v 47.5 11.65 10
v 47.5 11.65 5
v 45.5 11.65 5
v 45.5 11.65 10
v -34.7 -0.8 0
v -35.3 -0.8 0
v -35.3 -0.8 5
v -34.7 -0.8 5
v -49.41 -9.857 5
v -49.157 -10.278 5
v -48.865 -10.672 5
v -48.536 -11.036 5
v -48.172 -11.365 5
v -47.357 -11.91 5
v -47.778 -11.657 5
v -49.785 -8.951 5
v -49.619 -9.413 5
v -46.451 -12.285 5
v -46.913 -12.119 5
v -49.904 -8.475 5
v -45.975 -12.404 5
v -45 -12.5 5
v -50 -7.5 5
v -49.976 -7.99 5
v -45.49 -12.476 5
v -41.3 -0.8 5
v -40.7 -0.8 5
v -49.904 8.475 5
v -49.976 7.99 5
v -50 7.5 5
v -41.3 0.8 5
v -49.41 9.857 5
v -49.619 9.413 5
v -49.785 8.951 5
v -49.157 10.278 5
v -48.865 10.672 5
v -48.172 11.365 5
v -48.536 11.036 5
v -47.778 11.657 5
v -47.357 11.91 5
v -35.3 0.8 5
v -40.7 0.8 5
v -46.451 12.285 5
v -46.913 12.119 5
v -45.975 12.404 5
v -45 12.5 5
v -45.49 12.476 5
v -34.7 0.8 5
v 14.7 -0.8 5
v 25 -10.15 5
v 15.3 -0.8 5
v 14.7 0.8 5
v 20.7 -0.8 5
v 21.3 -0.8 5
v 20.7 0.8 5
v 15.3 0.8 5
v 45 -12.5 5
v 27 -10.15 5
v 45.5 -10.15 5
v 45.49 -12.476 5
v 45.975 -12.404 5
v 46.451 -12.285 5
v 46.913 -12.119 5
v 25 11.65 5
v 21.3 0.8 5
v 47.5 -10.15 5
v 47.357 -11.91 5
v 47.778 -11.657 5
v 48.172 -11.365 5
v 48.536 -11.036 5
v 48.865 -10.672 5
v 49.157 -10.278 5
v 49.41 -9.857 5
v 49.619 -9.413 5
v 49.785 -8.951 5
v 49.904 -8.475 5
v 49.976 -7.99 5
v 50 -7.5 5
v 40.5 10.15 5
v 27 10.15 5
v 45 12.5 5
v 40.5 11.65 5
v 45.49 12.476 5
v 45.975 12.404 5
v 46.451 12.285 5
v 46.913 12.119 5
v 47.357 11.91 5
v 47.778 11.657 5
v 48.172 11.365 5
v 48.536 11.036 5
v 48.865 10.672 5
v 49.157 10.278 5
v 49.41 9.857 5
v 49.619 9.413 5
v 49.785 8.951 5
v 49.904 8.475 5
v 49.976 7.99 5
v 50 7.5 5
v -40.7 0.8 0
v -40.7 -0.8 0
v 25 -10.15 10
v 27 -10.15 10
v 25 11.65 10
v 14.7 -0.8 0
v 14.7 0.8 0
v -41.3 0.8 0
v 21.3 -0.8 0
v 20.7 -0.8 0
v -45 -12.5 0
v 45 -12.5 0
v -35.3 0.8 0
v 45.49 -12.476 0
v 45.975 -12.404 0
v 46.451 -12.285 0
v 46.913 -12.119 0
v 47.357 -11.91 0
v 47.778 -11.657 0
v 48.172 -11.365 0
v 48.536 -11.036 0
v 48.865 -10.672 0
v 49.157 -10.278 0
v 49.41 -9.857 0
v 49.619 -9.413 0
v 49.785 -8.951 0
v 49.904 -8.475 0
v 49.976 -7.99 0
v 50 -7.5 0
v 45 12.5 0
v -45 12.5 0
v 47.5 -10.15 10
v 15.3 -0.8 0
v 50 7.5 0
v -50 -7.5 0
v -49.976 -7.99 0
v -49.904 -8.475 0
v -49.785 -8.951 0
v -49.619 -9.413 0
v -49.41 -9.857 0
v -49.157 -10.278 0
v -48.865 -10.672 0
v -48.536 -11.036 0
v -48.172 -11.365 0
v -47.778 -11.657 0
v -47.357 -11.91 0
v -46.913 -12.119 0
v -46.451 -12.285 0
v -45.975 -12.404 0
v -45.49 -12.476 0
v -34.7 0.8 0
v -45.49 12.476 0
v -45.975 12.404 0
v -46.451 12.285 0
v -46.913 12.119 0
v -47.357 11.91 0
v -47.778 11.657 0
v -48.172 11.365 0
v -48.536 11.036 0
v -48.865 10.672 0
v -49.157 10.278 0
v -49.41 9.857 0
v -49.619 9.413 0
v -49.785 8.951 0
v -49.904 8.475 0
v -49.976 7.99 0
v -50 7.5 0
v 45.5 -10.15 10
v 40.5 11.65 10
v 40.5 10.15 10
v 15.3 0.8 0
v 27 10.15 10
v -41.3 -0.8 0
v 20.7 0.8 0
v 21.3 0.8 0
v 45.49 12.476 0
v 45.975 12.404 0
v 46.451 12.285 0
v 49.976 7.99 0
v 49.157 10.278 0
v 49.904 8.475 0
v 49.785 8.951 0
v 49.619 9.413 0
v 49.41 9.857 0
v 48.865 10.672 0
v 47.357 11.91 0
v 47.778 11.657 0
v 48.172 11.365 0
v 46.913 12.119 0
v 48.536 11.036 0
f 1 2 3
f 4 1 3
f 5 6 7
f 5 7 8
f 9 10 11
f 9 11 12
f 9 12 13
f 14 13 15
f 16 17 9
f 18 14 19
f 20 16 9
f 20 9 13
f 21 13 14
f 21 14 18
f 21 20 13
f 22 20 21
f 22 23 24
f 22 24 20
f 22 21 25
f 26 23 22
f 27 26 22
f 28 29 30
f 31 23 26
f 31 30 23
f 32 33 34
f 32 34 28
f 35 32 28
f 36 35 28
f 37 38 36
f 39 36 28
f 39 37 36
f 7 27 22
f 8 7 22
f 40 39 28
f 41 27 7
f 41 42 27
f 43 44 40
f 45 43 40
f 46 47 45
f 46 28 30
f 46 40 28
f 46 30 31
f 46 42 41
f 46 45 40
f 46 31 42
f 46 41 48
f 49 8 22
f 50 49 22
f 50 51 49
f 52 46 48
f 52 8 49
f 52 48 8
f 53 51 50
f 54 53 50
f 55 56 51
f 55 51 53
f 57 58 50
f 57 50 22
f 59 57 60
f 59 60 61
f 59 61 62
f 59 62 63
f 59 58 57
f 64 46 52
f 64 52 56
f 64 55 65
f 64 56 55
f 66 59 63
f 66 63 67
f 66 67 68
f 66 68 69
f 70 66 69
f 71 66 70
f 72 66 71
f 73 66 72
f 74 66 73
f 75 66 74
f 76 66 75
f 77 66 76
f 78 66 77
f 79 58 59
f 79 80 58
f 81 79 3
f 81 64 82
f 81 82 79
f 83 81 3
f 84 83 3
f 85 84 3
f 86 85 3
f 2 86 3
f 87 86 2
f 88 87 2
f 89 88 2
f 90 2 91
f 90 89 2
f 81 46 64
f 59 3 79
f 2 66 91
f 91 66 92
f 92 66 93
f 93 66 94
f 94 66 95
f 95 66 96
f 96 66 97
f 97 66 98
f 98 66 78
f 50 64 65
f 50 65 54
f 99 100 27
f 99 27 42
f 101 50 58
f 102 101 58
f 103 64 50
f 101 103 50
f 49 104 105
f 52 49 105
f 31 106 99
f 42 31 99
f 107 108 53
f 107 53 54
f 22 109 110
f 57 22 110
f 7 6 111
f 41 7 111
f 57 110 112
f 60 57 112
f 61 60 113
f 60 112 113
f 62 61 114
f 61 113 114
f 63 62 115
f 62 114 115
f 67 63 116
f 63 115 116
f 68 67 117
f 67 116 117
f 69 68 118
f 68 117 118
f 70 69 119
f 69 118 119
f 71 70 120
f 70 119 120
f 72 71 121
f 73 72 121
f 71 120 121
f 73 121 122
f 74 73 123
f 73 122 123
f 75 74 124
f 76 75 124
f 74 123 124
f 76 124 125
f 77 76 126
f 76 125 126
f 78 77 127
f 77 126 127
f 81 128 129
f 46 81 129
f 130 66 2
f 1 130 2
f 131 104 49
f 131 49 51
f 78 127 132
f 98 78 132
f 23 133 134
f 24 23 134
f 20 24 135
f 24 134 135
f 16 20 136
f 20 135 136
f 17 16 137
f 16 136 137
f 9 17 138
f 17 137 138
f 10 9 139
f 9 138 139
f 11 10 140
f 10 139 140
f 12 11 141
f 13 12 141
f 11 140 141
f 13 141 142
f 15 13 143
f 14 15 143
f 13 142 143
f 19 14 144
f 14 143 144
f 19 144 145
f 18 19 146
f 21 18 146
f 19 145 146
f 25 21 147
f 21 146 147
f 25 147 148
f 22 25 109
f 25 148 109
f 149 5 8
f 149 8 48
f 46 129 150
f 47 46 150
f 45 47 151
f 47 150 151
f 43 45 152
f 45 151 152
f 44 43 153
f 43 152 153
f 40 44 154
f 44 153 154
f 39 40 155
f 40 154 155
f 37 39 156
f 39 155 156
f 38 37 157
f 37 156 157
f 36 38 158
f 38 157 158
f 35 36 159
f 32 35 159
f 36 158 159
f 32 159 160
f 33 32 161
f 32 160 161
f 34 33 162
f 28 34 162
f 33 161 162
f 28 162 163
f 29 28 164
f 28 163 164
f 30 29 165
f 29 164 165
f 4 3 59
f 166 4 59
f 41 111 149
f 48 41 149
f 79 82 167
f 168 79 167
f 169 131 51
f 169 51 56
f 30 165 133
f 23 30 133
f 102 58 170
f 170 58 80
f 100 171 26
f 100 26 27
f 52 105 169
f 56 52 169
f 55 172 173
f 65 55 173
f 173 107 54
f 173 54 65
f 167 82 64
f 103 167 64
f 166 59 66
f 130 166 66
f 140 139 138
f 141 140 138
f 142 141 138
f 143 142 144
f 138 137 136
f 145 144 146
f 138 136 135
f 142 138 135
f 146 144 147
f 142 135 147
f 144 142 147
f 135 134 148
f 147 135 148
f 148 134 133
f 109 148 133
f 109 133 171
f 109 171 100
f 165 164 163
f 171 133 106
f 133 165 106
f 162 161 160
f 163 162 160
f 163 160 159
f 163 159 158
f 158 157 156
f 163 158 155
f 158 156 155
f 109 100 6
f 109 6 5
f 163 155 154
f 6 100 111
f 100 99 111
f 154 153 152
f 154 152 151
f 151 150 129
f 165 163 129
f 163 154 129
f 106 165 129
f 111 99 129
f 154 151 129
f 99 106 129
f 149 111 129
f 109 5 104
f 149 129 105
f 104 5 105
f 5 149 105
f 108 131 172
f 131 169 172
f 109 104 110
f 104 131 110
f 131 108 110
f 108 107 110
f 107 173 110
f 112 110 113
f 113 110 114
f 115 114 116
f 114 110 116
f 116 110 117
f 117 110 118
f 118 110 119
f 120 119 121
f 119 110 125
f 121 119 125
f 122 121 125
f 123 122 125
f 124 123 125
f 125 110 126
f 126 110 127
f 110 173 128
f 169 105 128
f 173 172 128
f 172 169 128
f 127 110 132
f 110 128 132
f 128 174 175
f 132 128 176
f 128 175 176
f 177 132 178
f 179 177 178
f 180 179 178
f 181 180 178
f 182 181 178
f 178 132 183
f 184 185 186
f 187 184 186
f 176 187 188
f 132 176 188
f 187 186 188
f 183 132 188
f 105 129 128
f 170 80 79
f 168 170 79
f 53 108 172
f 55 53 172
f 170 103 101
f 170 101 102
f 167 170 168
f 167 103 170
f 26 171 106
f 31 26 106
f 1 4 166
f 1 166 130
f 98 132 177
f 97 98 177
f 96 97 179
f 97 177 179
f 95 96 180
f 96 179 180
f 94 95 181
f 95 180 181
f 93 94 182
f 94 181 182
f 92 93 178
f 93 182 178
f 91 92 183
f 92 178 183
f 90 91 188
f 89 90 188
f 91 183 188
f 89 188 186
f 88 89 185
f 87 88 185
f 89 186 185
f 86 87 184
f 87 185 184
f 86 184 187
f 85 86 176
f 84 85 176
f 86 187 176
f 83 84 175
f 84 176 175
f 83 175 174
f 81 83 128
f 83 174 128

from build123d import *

# Parameters (mm, degrees)
F0_W     = 0.6
F0_H     = 1.6
F1_DEPTH = 5
F3_DEPTH = 5
F4_W     = 5
F4_H     = 5
F5_DEPTH = 25


with BuildPart() as f1:
    # F0 (on Top) → F1 (new body)
    with BuildSketch(Plane.XY):
        with BuildLine():
            ThreePointArc((50, 7.5), (48.535534, 11.035534), (45, 12.5))
            Line((45, 12.5), (-45, 12.5))
            ThreePointArc((-45, 12.5), (-48.535534, 11.035534), (-50, 7.5))
            Line((-50, 7.5), (-50, -7.5))
            ThreePointArc((-50, -7.5), (-48.535534, -11.035534), (-45, -12.5))
            Line((-45, -12.5), (45, -12.5))
            ThreePointArc((45, -12.5), (48.535534, -11.035534), (50, -7.5))
            Line((50, -7.5), (50, 7.5))
        make_face()
        with Locations((-41, 0)):
            Rectangle(F0_W, F0_H, mode=Mode.SUBTRACT)
        with Locations((-35, 0)):
            Rectangle(F0_W, F0_H, mode=Mode.SUBTRACT)
        with Locations((15, 0)):
            Rectangle(F0_W, F0_H, mode=Mode.SUBTRACT)
        with Locations((21, 0)):
            Rectangle(F0_W, F0_H, mode=Mode.SUBTRACT)
    extrude(amount=F1_DEPTH)

    # F2 (on face) → F3 (join)
    with BuildSketch(Plane.XY.offset(5)):
        Polygon((25, -10.15), (27, -10.15), (27, 10.15), (45.5, 10.15), (45.5, -10.15), (47.5, -10.15), (47.5, 10.15), (47.5, 11.65), (25, 11.65), (25, 10.15), align=None)
    extrude(amount=F3_DEPTH)

    # F4 (on face) → F5 (cut)
    with BuildSketch(Plane(origin=(0, 11.65, 0), x_dir=(-1, 0, 0), z_dir=(0, 1, 0))):
        with Locations((-43, 7.5)):
            Rectangle(F4_W, F4_H)
    extrude(amount=-F5_DEPTH, mode=Mode.SUBTRACT)


solid = f1.part
